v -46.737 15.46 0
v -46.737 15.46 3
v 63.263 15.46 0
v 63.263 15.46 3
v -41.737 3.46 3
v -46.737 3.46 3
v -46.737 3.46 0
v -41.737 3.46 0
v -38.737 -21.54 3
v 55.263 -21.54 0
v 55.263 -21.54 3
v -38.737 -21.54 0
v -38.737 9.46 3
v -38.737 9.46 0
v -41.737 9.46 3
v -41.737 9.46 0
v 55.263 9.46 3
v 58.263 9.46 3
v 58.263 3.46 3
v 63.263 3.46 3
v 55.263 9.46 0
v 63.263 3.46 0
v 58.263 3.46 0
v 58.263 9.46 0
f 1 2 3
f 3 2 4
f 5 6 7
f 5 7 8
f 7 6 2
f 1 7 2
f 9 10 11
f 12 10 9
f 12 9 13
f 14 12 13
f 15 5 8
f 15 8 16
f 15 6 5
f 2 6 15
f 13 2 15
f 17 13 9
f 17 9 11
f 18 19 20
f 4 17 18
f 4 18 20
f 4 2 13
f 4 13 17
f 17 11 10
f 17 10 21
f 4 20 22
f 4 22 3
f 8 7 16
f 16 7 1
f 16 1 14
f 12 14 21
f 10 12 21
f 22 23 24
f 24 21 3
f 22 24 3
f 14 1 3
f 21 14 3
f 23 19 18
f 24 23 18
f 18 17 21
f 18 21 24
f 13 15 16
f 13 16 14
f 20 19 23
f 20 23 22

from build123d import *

# Parameters (mm, degrees)
EXTRUDE_1_DEPTH     = 3
SKETCH_2_W          = 100
SKETCH_2_H          = 37
EXTRUDE_2_DEPTH     = 3
SKETCH_3_W          = 5
SKETCH_3_H          = 12
EXTRUDE_3_DEPTH     = 3
SKETCH_4_W          = 3
SKETCH_4_H          = 31
CUT_EXTRUDE_1_DEPTH = 3


with BuildPart() as part:
    # 草圖1 → 填料-伸長1 (new body)
    with BuildSketch(Plane.XY):
        Polygon((49.262888429, -21.540240663), (49.262888429, -18.540240663), (39.262888429, -18.540240663), (39.262888429, -21.540240663), (25.262888429, -21.540240663), (25.262888429, -18.540240663), (15.262888429, -18.540240663), (15.262888429, -21.540240663), (1.262888429, -21.540240663), (1.262888429, -18.540240663), (-8.737111571, -18.540240663), (-8.737111571, -21.540240663), (-22.737111571, -21.540240663), (-22.737111571, -18.540240663), (-32.737111571, -18.540240663), (-32.737111571, -21.540240663), (-41.737111571, -21.540240663), (-41.737111571, -8.040240663), (-38.737111571, -8.040240663), (-38.737111571, 1.959759337), (-41.737111571, 1.959759337), (-41.737111571, 15.459759337), (-32.737111571, 15.459759337), (-32.737111571, 12.459759337), (-22.737111571, 12.459759337), (-22.737111571, 15.459759337), (-8.737111571, 15.459759337), (-8.737111571, 12.459759337), (1.262888429, 12.459759337), (1.262888429, 15.459759337), (15.262888429, 15.459759337), (15.262888429, 12.459759337), (25.262888429, 12.459759337), (25.262888429, 15.459759337), (39.262888429, 15.459759337), (39.262888429, 12.459759337), (49.262888429, 12.459759337), (49.262888429, 15.459759337), (58.262888429, 15.459759337), (58.262888429, 1.959759337), (55.262888429, 1.959759337), (55.262888429, -8.040240663), (58.262888429, -8.040240663), (58.262888429, -21.540240663), align=None)
    extrude(amount=EXTRUDE_1_DEPTH)

    # 草圖2 → 填料-伸長2 (add)
    with BuildSketch(Plane.XY.offset(3)):
        with Locations((8.262888429, -3.040240663)):
            Rectangle(SKETCH_2_W, SKETCH_2_H)
    extrude(amount=-EXTRUDE_2_DEPTH)

    # 草圖3 → 填料-伸長3 (add)
    with BuildSketch(Plane.XY.offset(3)):
        with Locations((60.762888429, 9.459759337)):
            Rectangle(SKETCH_3_W, SKETCH_3_H)
        with Locations((-44.237111571, 9.459759337)):
            Rectangle(SKETCH_3_W, SKETCH_3_H)
    extrude(amount=-EXTRUDE_3_DEPTH)

    # 草圖4 → 除料-伸長1 (cut)
    with BuildSketch(Plane.XY.offset(3)):
        with Locations((-40.237111571, -6.040240663)):
            Rectangle(SKETCH_4_W, SKETCH_4_H)
        with Locations((56.762888429, -6.040240663)):
            Rectangle(SKETCH_4_W, SKETCH_4_H)
    extrude(amount=-CUT_EXTRUDE_1_DEPTH, mode=Mode.SUBTRACT)


solid = part.part
